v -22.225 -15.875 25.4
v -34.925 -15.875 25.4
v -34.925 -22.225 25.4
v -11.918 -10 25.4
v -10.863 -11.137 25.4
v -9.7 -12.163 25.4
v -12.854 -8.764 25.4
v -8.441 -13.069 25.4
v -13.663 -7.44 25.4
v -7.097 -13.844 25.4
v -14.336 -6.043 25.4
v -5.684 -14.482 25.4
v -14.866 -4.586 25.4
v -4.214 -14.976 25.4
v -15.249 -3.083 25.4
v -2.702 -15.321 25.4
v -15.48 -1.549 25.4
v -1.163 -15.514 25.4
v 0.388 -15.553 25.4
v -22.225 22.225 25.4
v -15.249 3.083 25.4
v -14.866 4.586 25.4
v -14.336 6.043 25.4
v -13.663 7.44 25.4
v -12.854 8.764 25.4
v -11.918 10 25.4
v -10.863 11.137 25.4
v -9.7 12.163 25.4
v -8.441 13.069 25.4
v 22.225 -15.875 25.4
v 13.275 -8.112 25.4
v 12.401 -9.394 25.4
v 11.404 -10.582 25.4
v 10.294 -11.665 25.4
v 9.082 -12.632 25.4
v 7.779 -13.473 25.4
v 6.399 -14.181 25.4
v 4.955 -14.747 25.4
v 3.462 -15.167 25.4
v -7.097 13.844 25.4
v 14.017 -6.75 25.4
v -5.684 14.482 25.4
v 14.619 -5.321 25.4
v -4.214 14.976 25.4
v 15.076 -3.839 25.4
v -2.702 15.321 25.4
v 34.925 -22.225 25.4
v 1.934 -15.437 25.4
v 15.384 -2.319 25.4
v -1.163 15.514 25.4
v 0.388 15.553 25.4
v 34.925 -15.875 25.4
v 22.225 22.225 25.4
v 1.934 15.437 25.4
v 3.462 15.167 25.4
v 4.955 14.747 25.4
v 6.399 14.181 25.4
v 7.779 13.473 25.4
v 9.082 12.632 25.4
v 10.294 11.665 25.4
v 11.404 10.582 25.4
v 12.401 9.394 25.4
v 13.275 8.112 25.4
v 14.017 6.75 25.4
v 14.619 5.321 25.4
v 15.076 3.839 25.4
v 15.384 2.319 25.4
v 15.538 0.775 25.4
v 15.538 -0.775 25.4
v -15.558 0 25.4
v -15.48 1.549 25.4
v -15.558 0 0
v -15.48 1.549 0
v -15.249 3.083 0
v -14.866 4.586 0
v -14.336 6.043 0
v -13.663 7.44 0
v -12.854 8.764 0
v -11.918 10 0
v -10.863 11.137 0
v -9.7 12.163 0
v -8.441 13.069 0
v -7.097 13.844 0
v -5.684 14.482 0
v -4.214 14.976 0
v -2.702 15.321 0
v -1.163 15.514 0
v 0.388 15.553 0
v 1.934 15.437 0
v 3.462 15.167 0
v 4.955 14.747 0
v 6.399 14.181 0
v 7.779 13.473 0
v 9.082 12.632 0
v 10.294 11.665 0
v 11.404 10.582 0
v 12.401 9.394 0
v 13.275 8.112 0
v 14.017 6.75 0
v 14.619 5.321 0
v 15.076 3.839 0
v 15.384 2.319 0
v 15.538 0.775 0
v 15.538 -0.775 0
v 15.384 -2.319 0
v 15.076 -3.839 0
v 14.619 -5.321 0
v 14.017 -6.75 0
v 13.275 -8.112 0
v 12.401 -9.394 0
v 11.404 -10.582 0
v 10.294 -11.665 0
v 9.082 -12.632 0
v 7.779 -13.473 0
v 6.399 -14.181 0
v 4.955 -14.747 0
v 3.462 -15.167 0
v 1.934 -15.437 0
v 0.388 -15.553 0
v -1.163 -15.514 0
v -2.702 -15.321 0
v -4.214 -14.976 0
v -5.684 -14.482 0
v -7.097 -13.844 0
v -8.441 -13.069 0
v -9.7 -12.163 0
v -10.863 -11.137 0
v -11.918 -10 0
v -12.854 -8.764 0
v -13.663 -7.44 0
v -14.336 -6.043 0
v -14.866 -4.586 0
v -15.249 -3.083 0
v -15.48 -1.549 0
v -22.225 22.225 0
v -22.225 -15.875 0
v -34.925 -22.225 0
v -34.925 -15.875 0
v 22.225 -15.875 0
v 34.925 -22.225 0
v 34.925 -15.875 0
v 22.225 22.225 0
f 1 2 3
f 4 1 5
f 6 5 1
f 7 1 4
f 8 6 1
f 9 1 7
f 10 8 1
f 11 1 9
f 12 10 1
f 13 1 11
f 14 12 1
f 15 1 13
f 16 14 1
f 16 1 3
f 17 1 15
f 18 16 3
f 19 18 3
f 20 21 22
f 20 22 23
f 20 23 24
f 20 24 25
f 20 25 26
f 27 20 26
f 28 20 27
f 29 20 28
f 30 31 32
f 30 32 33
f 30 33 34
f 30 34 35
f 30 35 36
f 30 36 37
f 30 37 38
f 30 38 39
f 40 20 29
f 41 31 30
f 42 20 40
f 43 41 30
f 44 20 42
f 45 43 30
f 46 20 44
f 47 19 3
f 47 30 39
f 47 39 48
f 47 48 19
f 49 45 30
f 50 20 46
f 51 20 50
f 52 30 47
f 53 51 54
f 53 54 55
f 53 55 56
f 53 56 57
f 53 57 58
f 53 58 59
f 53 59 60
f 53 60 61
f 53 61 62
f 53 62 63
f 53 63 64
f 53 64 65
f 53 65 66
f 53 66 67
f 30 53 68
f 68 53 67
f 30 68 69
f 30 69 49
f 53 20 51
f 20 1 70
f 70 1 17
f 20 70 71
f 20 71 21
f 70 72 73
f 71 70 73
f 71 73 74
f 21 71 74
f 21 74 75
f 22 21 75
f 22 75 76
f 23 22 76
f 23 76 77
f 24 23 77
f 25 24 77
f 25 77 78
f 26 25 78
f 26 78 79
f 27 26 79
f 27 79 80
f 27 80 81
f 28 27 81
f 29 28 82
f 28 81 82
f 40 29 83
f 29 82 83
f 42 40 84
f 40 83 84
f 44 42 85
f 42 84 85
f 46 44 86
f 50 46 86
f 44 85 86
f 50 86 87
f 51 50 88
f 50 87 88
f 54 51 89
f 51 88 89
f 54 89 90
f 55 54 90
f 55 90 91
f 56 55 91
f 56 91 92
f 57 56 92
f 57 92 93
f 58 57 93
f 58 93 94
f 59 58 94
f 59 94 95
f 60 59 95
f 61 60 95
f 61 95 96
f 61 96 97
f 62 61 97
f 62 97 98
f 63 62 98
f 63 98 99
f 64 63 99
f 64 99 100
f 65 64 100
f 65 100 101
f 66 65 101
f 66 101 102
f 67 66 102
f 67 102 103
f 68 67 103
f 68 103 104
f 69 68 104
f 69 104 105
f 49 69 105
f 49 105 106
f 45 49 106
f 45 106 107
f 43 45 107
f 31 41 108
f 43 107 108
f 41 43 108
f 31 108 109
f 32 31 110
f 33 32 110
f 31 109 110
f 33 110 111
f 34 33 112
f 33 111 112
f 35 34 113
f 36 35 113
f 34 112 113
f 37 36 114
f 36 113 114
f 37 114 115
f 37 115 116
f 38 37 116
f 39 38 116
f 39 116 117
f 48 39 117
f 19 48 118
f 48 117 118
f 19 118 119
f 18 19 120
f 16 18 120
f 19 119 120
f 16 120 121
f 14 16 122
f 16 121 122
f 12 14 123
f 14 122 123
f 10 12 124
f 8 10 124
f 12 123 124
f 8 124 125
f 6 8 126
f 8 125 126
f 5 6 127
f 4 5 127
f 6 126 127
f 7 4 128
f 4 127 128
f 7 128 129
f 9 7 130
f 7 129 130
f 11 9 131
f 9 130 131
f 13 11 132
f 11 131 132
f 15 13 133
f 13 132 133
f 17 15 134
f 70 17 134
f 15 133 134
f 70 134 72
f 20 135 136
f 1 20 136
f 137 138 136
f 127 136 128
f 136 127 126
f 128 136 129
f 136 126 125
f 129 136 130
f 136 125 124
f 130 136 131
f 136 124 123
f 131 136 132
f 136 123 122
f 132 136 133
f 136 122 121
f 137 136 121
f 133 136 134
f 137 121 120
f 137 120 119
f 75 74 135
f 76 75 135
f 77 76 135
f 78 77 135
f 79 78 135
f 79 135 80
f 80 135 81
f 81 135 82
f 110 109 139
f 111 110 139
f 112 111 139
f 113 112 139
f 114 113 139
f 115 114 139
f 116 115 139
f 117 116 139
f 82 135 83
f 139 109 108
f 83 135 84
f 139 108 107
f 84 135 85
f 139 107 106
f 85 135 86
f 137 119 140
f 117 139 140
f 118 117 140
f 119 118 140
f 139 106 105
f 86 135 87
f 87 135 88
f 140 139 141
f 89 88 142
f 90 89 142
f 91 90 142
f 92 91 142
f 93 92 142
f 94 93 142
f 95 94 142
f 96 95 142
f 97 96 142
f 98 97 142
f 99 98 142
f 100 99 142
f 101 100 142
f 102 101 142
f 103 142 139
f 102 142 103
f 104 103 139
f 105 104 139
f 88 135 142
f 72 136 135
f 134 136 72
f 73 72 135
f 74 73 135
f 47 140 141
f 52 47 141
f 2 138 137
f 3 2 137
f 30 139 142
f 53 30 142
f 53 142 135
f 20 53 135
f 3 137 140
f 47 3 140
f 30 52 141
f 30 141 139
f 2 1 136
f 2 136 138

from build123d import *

# Parameters (mm, degrees)
BOSS_EXTRUDE2_DEPTH = 25.4
SKETCH2_R           = 15.5575
CUT_EXTRUDE1_DEPTH  = 49.568160867


with BuildPart() as part:
    # Sketch1 → Boss-Extrude2 (new body)
    with BuildSketch(Plane.XY):
        Polygon((-34.925, -22.225), (34.925, -22.225), (34.925, -15.875), (22.225, -15.875), (22.225, 22.225), (-22.225, 22.225), (-22.225, -15.875), (-34.925, -15.875), align=None)
    extrude(amount=BOSS_EXTRUDE2_DEPTH)

    # Sketch2 → Cut-Extrude1 (cut, through all)
    with BuildSketch(Plane(origin=(0, 0, 0), x_dir=(-1, 0, 0), z_dir=(0, 0, -1))):
        Circle(SKETCH2_R)
    extrude(amount=-CUT_EXTRUDE1_DEPTH, mode=Mode.SUBTRACT)


solid = part.part
